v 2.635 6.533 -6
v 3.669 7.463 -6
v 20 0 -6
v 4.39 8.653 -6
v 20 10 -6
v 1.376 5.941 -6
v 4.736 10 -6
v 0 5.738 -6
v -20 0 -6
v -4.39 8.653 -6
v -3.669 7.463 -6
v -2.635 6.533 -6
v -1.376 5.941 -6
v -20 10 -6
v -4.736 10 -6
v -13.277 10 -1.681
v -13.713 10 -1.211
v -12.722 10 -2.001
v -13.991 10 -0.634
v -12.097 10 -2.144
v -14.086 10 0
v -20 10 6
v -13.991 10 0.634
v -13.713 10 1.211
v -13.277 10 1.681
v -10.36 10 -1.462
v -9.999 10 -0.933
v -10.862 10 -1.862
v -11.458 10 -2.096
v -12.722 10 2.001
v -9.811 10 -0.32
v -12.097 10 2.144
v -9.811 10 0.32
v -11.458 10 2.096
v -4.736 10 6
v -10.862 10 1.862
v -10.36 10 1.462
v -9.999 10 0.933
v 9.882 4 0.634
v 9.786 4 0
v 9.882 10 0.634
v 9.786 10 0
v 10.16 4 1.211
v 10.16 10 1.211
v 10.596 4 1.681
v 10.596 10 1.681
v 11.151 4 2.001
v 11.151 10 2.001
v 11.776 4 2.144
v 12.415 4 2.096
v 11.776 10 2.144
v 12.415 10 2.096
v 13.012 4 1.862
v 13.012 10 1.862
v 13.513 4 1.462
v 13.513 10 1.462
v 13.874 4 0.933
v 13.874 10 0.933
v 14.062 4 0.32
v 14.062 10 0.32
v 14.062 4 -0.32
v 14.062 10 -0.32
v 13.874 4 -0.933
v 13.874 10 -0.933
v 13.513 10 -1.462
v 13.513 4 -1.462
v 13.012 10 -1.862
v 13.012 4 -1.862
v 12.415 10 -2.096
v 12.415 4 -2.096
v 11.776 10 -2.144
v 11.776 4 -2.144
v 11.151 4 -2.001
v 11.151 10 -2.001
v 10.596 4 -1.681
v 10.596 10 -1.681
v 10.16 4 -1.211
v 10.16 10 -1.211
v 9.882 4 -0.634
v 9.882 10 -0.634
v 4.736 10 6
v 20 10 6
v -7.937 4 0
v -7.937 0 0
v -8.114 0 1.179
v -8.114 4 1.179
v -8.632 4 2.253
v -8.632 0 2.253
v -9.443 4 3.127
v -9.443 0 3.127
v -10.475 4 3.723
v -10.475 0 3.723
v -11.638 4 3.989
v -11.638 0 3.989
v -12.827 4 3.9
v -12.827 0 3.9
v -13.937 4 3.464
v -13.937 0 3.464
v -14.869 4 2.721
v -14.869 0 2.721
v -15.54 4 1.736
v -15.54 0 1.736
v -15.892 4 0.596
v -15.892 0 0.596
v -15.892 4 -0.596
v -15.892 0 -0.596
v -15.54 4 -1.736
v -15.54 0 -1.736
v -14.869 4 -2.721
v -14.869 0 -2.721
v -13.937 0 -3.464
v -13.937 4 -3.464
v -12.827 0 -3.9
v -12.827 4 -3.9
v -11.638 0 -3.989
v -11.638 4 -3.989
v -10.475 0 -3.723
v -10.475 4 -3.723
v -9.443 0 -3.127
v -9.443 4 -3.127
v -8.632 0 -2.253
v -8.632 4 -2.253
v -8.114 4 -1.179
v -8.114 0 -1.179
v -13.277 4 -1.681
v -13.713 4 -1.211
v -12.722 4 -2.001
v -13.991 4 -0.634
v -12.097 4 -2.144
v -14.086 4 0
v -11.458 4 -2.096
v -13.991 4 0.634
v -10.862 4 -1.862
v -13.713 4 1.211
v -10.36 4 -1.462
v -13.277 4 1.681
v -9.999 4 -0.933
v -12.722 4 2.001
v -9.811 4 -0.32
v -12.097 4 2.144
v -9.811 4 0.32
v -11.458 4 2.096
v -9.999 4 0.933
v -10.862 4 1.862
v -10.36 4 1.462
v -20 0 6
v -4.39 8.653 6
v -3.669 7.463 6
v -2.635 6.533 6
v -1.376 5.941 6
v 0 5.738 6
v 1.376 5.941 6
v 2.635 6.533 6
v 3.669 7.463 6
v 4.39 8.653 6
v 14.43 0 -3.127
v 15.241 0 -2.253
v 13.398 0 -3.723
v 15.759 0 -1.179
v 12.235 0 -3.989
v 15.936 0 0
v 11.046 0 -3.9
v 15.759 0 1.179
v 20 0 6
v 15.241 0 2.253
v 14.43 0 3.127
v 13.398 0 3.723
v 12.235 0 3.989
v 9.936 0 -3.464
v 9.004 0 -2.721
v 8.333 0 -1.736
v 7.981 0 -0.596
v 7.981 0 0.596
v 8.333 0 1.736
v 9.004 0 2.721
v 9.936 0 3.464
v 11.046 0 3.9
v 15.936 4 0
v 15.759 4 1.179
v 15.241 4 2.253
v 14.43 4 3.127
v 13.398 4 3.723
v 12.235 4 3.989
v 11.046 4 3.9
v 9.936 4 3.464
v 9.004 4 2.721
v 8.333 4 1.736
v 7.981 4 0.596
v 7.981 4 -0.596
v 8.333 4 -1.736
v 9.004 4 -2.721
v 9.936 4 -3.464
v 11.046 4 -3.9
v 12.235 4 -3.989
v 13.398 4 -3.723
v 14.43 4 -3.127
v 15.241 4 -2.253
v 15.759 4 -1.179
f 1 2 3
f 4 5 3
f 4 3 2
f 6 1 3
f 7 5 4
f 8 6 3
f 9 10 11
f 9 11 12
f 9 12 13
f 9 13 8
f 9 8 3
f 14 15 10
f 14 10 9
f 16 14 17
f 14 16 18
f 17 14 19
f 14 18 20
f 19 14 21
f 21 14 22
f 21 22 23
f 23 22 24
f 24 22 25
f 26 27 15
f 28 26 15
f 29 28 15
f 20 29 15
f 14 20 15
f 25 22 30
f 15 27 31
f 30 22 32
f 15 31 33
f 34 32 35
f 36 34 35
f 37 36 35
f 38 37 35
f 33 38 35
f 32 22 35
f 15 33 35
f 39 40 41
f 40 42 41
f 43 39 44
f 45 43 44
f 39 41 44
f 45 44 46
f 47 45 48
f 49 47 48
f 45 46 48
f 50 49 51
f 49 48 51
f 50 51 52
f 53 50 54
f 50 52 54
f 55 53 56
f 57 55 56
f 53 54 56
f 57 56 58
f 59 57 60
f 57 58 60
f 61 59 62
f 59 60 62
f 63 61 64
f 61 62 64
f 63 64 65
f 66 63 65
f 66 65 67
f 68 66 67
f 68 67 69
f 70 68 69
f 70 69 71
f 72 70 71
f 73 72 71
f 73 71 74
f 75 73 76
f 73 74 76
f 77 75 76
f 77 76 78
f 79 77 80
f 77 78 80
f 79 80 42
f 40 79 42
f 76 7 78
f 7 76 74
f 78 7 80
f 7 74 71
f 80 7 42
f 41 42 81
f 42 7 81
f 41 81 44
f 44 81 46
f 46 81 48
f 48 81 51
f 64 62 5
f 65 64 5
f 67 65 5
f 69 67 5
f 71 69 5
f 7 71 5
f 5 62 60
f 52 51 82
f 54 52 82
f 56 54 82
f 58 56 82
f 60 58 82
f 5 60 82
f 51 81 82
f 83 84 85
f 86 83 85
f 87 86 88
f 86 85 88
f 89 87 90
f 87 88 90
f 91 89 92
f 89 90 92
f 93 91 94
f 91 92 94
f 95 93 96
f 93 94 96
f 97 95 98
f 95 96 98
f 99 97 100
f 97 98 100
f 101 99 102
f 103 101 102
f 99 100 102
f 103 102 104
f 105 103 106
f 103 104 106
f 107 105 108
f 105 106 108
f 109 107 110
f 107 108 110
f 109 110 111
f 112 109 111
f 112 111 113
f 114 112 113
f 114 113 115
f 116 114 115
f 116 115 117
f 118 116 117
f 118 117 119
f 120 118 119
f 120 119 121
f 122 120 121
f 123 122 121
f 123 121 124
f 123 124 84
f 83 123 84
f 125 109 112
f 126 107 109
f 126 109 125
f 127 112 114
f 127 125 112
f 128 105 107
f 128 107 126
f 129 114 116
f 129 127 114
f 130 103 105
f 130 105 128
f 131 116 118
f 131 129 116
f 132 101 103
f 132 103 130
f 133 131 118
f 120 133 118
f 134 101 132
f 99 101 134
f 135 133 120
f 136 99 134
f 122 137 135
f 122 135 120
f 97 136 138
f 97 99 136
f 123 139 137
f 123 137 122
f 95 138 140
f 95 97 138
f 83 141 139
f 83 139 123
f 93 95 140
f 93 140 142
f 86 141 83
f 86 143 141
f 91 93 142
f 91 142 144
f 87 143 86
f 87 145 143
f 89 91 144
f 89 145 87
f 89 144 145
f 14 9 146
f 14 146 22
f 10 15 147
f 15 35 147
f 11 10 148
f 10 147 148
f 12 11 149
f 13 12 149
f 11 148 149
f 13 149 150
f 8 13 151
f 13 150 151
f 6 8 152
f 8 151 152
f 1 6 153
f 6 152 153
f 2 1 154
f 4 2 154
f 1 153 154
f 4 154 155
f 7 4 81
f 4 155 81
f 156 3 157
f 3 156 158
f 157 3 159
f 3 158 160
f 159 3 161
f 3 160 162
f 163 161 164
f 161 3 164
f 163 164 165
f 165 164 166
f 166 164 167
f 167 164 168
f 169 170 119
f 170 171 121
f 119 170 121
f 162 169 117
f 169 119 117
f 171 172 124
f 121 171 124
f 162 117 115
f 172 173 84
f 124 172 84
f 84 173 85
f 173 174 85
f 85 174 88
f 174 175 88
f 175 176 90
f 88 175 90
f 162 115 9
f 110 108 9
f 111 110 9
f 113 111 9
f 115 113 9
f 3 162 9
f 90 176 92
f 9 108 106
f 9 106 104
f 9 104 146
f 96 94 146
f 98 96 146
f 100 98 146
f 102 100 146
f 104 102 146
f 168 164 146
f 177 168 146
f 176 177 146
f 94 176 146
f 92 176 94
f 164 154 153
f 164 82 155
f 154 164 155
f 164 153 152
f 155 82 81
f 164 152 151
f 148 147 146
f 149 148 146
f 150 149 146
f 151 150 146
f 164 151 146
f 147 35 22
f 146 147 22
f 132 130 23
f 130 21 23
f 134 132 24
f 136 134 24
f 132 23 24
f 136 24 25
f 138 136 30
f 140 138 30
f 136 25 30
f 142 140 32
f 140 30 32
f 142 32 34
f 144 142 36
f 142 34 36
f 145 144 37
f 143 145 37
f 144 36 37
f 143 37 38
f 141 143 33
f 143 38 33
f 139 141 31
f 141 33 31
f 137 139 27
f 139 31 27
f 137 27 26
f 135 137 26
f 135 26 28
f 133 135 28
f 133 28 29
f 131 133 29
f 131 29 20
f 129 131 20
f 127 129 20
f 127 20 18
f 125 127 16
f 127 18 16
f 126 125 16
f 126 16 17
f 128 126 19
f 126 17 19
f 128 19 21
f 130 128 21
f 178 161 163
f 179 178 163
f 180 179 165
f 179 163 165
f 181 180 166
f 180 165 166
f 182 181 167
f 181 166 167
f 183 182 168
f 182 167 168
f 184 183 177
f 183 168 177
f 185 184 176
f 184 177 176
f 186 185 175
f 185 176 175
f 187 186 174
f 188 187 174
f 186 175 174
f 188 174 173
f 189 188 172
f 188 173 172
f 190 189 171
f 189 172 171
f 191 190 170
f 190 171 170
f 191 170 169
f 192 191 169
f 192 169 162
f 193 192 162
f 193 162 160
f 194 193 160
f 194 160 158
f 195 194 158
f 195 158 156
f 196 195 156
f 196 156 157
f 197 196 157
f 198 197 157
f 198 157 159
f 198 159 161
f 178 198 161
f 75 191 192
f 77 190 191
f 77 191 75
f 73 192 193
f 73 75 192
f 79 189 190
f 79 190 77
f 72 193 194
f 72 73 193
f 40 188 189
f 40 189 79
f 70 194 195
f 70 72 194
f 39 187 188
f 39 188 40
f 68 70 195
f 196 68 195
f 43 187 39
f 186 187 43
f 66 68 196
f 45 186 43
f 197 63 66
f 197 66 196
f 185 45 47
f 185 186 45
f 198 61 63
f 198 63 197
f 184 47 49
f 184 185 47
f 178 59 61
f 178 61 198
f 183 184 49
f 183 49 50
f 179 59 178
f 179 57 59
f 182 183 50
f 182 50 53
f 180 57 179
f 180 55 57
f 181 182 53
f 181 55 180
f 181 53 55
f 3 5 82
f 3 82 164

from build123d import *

# Parameters (mm, degrees)
BOSS_EXTRUDE1_DEPTH            = 6
CBORE_FOR_M4_SHCS1_D           = 4.3
CBORE_FOR_M4_SHCS1_CBORE_D     = 8
CBORE_FOR_M4_SHCS1_CBORE_DEPTH = 4


with BuildPart() as part:
    # Sketch1 → Boss-Extrude1 (new, symmetric)
    with BuildSketch(Plane.XY):
        with BuildLine():
            Line((20, 0), (-20, 0))
            Line((-20, 0), (-20, 10))
            Line((-20, 10), (-4.736180555, 10))
            ThreePointArc((-4.736180555, 10), (0, 5.7375), (4.736180555, 10))
            Line((4.736180555, 10), (20, 10))
            Line((20, 10), (20, 0))
        make_face()
    extrude(amount=BOSS_EXTRUDE1_DEPTH, both=True)

    # CBORE for M4 SHCS1 (through all)
    with Locations(Plane.XZ):
        with Locations((-11.9365, 0), (11.9365, 0)):
            CounterBoreHole(CBORE_FOR_M4_SHCS1_D / 2, CBORE_FOR_M4_SHCS1_CBORE_D / 2, CBORE_FOR_M4_SHCS1_CBORE_DEPTH)


solid = part.part
